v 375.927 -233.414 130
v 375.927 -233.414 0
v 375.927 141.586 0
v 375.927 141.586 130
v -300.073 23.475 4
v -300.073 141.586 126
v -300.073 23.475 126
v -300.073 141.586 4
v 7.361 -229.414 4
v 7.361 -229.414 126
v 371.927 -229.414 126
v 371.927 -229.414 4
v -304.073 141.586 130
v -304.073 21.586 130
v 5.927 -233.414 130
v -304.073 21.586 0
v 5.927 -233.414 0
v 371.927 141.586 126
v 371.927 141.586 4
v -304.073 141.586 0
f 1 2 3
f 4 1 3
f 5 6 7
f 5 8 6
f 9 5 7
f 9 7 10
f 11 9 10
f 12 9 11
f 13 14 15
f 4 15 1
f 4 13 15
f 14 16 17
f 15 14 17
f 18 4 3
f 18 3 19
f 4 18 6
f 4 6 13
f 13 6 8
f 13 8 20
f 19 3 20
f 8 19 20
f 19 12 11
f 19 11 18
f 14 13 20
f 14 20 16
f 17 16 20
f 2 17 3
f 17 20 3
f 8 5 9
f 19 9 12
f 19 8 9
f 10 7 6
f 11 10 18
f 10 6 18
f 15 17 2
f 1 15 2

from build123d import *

# Parameters (mm, degrees)
BOSS_EXTRUDE1_DEPTH = 130
SHELL1_T            = -4


with BuildPart() as part:
    # Sketch1 → Boss-Extrude1 (new body)
    with BuildSketch(Plane.XY):
        Polygon((-304.073172001, 21.586402266), (5.926827999, -233.413597734), (375.926827999, -233.413597734), (375.926827999, 141.586402266), (-304.073172001, 141.586402266), align=None)
    extrude(amount=BOSS_EXTRUDE1_DEPTH)

    # Shell1
    shell1_openings = [part.faces().sort_by_distance(p)[0] for p in [
        (35.926827999, 141.586402266, 65),
    ]]
    offset(amount=SHELL1_T, openings=shell1_openings, kind=Kind.INTERSECTION)


solid = part.part
